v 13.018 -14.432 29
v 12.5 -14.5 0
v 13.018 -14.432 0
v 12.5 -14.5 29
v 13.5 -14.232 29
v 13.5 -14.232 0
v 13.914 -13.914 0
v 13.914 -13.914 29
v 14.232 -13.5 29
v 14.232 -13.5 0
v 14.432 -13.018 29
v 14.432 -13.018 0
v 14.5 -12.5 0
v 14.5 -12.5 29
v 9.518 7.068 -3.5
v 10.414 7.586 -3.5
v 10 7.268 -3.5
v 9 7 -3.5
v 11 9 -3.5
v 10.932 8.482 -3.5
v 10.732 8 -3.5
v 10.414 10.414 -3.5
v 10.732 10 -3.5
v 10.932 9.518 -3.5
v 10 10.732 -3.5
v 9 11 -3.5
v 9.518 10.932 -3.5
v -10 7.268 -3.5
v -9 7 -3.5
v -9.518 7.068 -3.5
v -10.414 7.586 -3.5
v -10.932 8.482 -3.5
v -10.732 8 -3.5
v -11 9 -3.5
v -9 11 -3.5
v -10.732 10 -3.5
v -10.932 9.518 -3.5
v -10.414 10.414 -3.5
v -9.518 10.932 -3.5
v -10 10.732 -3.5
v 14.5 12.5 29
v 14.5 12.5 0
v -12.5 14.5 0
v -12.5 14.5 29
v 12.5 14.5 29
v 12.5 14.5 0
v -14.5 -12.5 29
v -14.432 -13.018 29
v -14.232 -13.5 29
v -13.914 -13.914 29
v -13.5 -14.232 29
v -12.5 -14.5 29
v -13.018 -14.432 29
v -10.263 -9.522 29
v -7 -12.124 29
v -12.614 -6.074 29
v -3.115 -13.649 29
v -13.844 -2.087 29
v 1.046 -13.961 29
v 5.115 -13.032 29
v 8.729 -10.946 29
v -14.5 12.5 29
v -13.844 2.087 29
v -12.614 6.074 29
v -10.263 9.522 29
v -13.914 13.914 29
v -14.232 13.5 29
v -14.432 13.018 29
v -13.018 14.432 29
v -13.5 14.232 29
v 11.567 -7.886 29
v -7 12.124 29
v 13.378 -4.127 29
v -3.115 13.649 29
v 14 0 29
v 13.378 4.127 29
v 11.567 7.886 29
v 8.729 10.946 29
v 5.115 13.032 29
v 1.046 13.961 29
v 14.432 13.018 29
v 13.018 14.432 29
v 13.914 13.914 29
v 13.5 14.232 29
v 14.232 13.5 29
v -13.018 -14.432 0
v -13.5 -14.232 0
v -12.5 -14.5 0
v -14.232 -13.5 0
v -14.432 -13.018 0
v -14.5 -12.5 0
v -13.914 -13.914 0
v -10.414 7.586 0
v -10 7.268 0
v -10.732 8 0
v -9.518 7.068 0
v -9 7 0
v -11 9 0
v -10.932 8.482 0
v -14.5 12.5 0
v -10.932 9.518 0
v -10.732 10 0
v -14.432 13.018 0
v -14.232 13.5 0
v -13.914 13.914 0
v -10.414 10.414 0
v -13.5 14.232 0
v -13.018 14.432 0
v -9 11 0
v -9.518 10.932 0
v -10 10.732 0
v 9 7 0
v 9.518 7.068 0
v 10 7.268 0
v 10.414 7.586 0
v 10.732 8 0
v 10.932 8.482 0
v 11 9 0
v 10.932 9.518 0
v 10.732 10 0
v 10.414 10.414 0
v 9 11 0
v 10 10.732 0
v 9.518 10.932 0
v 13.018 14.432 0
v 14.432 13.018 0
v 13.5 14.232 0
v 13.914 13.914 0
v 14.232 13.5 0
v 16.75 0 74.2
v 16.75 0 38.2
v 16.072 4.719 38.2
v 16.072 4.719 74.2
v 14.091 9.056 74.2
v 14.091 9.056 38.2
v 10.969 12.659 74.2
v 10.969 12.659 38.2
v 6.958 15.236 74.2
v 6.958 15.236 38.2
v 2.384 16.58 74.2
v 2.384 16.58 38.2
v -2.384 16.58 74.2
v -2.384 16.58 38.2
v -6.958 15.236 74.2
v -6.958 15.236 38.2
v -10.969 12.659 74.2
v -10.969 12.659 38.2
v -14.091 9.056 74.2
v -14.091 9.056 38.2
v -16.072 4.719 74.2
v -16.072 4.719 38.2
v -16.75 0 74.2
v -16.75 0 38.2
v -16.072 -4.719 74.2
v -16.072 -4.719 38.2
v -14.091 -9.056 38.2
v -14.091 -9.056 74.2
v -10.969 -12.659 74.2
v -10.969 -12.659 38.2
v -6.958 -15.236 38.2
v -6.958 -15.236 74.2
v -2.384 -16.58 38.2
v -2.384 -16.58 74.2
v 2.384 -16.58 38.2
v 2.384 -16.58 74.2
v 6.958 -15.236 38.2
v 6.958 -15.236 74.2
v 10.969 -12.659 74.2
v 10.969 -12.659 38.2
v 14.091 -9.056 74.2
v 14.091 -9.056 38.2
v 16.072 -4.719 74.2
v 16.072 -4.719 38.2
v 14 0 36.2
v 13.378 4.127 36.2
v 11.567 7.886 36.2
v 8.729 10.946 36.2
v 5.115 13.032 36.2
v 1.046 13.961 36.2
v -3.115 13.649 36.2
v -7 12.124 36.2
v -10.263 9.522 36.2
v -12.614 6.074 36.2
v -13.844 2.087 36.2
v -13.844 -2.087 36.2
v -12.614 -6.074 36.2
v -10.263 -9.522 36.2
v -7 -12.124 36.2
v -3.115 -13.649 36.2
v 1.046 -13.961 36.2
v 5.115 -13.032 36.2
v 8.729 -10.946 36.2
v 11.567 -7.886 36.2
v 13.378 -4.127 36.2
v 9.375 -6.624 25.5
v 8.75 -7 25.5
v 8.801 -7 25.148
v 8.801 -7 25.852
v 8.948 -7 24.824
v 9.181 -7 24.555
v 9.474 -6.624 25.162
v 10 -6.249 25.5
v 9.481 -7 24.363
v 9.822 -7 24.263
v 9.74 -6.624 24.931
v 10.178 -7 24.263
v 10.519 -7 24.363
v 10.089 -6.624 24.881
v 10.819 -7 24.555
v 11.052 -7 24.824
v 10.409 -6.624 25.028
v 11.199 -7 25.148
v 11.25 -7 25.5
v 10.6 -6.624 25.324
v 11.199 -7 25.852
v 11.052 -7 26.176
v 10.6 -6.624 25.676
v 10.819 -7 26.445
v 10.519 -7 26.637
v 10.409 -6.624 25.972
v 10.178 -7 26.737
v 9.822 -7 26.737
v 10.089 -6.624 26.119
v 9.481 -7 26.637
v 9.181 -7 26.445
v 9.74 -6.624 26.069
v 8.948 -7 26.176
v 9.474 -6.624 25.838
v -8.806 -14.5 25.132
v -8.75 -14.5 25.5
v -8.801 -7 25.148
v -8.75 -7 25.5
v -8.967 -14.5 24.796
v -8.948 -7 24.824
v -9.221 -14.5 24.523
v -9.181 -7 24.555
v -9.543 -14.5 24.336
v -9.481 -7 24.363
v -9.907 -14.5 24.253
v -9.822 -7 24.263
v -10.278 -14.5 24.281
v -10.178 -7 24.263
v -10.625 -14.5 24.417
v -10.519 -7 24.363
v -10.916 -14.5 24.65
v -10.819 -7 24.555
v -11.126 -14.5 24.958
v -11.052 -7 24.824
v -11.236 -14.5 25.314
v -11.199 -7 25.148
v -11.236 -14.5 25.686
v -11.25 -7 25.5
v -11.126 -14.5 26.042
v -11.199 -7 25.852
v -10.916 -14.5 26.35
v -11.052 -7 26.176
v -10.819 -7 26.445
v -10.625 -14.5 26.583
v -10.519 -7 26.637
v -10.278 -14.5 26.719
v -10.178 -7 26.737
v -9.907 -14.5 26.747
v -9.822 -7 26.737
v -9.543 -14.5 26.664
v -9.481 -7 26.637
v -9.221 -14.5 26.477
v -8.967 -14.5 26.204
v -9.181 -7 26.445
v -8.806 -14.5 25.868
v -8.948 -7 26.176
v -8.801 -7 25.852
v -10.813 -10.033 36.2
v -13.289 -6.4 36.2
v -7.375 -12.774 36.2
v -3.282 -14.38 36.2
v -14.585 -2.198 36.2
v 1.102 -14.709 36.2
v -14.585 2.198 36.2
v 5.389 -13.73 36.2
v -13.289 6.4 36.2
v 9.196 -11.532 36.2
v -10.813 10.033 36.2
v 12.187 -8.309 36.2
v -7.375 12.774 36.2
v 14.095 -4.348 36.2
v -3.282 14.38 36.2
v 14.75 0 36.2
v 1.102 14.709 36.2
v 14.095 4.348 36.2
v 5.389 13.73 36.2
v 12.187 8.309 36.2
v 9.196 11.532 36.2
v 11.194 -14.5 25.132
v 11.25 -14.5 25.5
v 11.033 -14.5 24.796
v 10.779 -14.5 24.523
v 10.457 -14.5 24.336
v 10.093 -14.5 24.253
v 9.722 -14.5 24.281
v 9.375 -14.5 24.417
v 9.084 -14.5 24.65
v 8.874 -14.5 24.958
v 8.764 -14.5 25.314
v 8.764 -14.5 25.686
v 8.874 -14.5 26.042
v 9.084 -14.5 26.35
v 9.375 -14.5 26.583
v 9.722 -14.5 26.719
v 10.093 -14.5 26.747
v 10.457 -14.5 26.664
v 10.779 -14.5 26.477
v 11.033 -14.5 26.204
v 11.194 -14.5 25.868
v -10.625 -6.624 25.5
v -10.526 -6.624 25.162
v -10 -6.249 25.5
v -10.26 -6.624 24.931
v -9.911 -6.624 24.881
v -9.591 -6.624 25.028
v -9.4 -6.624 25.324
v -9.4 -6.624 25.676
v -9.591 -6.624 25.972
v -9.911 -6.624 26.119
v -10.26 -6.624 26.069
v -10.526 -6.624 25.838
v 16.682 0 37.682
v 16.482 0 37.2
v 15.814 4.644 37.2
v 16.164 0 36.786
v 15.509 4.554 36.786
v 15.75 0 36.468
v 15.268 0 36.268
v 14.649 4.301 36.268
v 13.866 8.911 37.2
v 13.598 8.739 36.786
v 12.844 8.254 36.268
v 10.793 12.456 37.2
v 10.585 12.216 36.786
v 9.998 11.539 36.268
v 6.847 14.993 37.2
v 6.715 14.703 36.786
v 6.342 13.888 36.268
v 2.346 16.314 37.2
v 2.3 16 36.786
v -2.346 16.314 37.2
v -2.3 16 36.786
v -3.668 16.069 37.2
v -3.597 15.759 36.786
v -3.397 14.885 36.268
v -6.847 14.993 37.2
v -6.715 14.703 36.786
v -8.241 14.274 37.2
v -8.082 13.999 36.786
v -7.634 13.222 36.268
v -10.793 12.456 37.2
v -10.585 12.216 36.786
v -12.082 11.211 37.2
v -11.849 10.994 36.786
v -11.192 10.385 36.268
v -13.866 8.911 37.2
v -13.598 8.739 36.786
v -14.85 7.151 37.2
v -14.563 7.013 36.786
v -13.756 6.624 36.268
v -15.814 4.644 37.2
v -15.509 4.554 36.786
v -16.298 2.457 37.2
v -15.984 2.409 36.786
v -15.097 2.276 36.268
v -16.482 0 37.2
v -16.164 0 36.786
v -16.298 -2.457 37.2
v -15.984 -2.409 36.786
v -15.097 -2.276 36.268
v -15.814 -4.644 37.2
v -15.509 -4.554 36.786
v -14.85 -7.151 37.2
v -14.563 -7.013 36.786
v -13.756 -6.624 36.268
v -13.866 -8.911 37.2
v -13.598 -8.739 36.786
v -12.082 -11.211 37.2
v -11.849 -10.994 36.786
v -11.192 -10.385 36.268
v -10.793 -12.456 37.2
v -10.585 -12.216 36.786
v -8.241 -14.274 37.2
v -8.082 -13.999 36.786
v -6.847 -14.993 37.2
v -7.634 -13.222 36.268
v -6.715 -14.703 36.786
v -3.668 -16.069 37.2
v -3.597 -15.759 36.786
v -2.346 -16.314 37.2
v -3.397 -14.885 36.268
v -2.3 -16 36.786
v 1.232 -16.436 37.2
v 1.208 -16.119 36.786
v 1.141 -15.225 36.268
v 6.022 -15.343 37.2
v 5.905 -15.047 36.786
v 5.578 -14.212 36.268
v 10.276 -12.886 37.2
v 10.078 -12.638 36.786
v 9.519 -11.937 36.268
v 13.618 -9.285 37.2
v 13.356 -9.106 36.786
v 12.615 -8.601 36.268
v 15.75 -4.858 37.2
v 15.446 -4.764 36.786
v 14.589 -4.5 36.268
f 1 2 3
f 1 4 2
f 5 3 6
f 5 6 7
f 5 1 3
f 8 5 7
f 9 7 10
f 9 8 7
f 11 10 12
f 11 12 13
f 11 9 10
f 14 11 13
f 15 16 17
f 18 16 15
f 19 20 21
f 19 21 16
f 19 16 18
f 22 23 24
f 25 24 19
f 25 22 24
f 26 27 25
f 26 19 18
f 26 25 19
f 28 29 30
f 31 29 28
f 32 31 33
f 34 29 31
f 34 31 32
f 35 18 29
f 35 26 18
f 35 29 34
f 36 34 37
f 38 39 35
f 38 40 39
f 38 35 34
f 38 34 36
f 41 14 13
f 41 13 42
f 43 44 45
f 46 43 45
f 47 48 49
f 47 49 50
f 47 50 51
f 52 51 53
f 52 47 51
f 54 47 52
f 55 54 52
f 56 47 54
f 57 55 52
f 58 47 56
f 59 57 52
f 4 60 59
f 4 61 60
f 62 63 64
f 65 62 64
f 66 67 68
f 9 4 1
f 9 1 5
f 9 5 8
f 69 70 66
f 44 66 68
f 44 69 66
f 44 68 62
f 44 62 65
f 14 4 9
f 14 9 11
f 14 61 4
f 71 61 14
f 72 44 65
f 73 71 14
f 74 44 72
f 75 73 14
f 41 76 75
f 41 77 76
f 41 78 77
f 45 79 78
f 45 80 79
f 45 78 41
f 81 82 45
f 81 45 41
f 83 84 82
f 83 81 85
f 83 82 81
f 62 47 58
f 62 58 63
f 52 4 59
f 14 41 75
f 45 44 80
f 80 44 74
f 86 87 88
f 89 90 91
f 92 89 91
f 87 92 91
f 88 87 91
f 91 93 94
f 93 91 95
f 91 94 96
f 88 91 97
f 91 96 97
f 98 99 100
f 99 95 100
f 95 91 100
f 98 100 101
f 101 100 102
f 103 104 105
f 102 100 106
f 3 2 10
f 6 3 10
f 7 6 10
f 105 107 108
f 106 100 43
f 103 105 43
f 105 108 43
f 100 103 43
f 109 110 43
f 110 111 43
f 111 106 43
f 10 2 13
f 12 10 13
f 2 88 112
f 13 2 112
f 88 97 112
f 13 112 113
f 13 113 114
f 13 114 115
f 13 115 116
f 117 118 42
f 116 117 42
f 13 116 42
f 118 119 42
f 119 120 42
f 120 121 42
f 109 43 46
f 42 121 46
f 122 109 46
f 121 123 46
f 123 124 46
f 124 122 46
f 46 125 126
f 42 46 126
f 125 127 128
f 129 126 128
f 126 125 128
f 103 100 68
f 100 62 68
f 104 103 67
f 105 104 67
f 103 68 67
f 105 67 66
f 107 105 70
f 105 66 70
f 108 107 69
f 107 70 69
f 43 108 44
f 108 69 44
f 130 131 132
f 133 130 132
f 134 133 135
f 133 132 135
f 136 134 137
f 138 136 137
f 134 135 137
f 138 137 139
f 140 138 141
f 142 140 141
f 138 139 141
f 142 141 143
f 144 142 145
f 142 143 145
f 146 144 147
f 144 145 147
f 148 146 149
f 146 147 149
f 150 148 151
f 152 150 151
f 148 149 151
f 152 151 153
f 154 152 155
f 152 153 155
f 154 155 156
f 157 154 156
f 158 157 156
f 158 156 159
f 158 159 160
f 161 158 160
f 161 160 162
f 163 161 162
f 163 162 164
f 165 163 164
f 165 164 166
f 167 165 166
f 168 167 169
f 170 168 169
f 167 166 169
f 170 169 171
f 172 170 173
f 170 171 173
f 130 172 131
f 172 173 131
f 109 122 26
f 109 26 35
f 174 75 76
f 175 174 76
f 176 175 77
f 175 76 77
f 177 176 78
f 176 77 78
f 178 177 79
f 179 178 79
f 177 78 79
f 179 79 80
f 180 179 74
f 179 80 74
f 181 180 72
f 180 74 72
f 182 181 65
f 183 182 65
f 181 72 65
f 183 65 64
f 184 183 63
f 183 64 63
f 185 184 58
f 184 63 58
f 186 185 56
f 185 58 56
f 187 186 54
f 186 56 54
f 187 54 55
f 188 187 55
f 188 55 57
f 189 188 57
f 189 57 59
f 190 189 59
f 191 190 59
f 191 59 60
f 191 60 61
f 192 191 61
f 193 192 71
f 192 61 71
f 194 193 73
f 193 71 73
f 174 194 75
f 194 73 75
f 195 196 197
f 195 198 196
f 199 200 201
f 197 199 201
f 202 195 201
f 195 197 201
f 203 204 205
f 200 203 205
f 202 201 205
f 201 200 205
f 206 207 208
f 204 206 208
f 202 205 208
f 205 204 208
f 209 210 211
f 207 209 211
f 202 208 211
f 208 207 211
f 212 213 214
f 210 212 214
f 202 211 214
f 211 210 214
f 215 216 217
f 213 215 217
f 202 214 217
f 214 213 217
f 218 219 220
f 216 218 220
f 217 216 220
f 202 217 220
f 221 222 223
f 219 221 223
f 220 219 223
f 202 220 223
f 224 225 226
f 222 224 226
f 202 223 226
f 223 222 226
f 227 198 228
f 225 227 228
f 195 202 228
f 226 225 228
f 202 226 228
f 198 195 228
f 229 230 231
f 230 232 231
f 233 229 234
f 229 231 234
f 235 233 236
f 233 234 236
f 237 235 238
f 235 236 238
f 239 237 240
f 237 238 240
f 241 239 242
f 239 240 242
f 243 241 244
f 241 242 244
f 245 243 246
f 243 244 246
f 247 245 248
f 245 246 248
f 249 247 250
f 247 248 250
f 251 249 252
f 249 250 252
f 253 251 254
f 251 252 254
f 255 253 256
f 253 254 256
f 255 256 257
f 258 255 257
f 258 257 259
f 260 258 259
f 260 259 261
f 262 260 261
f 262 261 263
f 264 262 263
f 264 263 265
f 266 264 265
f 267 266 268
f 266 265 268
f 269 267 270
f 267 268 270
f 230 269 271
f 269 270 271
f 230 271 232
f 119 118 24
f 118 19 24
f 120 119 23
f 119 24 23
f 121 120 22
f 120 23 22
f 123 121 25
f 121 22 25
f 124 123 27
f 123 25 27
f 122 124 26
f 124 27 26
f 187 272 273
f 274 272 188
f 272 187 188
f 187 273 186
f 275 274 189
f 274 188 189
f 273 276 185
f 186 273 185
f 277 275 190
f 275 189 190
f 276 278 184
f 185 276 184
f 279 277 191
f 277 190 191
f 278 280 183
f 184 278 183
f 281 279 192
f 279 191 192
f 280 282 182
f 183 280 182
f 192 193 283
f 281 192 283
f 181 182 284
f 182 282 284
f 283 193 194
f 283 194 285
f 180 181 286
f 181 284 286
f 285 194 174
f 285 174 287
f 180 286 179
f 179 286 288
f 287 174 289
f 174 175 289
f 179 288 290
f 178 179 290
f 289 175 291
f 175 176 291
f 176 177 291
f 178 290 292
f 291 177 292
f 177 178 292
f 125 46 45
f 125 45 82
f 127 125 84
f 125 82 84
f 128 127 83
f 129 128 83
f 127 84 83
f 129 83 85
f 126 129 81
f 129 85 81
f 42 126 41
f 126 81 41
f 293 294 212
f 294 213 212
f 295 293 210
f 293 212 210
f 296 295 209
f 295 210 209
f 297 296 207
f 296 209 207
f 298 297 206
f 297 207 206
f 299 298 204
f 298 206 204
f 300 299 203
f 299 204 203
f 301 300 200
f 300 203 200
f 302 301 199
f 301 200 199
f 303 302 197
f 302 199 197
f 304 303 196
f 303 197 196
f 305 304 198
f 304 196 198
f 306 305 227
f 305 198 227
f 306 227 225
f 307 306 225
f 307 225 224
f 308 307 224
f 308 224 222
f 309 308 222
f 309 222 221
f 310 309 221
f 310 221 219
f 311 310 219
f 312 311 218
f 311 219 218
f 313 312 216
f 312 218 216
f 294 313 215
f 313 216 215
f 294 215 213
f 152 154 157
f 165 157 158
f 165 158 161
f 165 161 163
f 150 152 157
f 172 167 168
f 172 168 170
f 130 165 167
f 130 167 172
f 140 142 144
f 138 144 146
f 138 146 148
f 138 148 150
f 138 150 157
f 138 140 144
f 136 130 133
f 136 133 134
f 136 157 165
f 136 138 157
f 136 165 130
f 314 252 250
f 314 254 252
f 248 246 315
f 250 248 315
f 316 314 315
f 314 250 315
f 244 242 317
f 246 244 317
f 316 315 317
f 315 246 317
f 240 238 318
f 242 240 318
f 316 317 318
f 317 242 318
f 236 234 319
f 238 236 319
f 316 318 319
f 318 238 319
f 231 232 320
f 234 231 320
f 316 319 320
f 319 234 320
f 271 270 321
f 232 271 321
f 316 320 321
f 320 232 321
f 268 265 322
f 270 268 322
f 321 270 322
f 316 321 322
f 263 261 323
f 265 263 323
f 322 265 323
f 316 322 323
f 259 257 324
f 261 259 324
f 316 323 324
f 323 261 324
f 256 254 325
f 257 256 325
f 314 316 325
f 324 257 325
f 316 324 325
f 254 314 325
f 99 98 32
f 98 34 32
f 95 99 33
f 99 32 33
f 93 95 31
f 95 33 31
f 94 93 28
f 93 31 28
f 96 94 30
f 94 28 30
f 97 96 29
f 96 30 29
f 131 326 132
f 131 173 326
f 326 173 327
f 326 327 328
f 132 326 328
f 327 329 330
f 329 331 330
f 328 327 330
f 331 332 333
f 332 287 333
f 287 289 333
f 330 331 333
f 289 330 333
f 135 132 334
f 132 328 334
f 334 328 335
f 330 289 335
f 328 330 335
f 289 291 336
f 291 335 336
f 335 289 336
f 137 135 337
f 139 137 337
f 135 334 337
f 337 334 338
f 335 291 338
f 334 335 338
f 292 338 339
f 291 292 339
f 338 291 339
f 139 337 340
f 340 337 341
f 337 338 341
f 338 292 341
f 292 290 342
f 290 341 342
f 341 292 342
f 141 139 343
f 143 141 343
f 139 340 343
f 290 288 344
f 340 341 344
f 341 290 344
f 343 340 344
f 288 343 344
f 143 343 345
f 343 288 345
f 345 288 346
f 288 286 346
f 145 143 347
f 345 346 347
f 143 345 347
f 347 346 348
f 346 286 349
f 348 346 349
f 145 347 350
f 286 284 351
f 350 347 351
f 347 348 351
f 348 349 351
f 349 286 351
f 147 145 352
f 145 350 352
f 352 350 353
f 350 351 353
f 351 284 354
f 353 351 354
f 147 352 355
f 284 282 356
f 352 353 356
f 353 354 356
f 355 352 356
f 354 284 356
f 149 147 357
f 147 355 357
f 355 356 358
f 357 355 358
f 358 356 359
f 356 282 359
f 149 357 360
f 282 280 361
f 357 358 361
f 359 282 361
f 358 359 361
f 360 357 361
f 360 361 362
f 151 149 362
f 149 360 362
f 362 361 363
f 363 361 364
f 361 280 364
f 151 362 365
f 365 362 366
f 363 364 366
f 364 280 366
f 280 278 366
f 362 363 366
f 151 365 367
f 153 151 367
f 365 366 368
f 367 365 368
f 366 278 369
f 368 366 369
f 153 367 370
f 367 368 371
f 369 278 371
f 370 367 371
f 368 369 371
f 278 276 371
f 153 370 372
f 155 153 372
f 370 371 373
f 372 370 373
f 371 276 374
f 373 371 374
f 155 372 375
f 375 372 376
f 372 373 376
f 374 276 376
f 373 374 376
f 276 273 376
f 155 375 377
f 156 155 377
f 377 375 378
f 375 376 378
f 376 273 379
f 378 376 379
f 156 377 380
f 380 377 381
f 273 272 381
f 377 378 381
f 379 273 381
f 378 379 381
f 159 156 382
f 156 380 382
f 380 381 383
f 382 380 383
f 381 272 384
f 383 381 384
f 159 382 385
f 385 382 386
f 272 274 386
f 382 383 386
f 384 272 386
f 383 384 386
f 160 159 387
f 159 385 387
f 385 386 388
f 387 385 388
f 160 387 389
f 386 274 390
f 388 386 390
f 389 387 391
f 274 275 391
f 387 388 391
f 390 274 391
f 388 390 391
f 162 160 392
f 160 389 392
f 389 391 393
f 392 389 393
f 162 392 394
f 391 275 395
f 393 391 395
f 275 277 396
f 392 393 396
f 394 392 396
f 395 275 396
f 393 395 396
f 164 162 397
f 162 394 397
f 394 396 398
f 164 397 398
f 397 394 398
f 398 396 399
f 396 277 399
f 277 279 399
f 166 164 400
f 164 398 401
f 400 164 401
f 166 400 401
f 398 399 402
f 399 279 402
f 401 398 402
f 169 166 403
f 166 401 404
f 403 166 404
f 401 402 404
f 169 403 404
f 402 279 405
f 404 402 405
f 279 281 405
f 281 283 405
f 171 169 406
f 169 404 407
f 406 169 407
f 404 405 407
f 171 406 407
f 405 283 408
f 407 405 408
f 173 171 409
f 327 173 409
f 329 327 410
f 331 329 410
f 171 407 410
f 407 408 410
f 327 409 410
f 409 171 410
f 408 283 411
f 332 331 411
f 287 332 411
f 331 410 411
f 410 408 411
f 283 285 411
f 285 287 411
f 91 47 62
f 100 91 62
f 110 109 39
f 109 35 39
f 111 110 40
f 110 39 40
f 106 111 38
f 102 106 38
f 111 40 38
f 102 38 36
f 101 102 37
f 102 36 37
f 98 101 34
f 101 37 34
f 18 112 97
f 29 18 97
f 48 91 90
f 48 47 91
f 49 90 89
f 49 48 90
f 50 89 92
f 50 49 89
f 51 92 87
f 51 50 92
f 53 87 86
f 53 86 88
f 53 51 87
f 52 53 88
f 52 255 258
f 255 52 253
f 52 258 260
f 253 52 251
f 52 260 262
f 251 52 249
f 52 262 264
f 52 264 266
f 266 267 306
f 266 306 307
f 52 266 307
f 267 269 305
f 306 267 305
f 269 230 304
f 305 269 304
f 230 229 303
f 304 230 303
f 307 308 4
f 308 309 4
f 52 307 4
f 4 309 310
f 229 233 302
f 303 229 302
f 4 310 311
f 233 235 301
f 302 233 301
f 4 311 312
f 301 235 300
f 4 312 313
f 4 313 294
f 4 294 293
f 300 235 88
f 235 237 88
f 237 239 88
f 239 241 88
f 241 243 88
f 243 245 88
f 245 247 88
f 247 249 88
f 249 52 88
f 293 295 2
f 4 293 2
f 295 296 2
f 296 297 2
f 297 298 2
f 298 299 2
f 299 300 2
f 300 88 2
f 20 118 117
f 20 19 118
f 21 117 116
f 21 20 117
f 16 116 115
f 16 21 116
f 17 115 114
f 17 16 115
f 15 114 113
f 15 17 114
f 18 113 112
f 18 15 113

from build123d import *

# Parameters (mm, degrees)
SKETCH_1_W             = 29
SKETCH_1_H             = 29
EXTRUDE_1_DEPTH        = 29
SKETCH_2_R             = 14
EXTRUDE_2_DEPTH        = 7.2
HOLE_WIZARD_M3_1_D     = 2.5
HOLE_WIZARD_M3_1_DEPTH = 7.5
HOLE_WIZARD_M3_1_TIP   = 0.751075774
SKETCH_6_R             = 16.75
EXTRUDE_3_DEPTH        = 38
FILLET_1_R             = 2
SKETCH_7_W             = 22
SKETCH_7_H             = 4
EXTRUDE_4_DEPTH        = 3.5
FILLET_2_R             = 2


with BuildPart() as part:
    # 草图1 → 凸台-拉伸1 (new body)
    with BuildSketch(Plane.XY):
        Rectangle(SKETCH_1_W, SKETCH_1_H)
    extrude(amount=EXTRUDE_1_DEPTH)

    # 草图2 → 凸台-拉伸2 (add)
    with BuildSketch(Plane.XY.offset(29)):
        Circle(SKETCH_2_R)
    extrude(amount=EXTRUDE_2_DEPTH)

    # M3 螺纹孔1
    with Locations(Plane(origin=(0, -14.5, 0), x_dir=(-1, 0, 0), z_dir=(0, -1, 0))):
        with Locations((10, -25.5), (-10, -25.5)):
            Hole(HOLE_WIZARD_M3_1_D / 2, depth=HOLE_WIZARD_M3_1_DEPTH)
            with Locations((0, 0, -(HOLE_WIZARD_M3_1_DEPTH + HOLE_WIZARD_M3_1_TIP / 2))):  # 118° drill point
                Cone(0, HOLE_WIZARD_M3_1_D / 2, HOLE_WIZARD_M3_1_TIP, mode=Mode.SUBTRACT)

    # 草图6 → 凸台-拉伸3 (add)
    with BuildSketch(Plane.XY.offset(36.2)):
        Circle(SKETCH_6_R)
    extrude(amount=EXTRUDE_3_DEPTH)

    # 圆角1
    fillet_1_edges = [part.edges().sort_by_distance(p)[0] for p in [
        (-16.75, 0, 36.2),
        (-14.5, 14.5, 14.5),
        (14.5, 14.5, 14.5),
        (14.5, -14.5, 14.5),
        (-14.5, -14.5, 14.5),
    ]]
    fillet(fillet_1_edges, radius=FILLET_1_R)

    # 草图7 → 凸台-拉伸4 (add)
    with BuildSketch(Plane(origin=(0, 0, 0), x_dir=(-1, 0, 0), z_dir=(0, 0, -1))):
        with Locations((0, 9)):
            Rectangle(SKETCH_7_W, SKETCH_7_H)
    extrude(amount=EXTRUDE_4_DEPTH)

    # 圆角2
    fillet_2_edges = [part.edges().sort_by_distance(p)[0] for p in [
        (-11, 7, -1.75),
        (-11, 11, -1.75),
        (11, 7, -1.75),
        (11, 11, -1.75),
    ]]
    fillet(fillet_2_edges, radius=FILLET_2_R - 0.0001)  # a hair under: the kernel refuses the full size


solid = part.part
